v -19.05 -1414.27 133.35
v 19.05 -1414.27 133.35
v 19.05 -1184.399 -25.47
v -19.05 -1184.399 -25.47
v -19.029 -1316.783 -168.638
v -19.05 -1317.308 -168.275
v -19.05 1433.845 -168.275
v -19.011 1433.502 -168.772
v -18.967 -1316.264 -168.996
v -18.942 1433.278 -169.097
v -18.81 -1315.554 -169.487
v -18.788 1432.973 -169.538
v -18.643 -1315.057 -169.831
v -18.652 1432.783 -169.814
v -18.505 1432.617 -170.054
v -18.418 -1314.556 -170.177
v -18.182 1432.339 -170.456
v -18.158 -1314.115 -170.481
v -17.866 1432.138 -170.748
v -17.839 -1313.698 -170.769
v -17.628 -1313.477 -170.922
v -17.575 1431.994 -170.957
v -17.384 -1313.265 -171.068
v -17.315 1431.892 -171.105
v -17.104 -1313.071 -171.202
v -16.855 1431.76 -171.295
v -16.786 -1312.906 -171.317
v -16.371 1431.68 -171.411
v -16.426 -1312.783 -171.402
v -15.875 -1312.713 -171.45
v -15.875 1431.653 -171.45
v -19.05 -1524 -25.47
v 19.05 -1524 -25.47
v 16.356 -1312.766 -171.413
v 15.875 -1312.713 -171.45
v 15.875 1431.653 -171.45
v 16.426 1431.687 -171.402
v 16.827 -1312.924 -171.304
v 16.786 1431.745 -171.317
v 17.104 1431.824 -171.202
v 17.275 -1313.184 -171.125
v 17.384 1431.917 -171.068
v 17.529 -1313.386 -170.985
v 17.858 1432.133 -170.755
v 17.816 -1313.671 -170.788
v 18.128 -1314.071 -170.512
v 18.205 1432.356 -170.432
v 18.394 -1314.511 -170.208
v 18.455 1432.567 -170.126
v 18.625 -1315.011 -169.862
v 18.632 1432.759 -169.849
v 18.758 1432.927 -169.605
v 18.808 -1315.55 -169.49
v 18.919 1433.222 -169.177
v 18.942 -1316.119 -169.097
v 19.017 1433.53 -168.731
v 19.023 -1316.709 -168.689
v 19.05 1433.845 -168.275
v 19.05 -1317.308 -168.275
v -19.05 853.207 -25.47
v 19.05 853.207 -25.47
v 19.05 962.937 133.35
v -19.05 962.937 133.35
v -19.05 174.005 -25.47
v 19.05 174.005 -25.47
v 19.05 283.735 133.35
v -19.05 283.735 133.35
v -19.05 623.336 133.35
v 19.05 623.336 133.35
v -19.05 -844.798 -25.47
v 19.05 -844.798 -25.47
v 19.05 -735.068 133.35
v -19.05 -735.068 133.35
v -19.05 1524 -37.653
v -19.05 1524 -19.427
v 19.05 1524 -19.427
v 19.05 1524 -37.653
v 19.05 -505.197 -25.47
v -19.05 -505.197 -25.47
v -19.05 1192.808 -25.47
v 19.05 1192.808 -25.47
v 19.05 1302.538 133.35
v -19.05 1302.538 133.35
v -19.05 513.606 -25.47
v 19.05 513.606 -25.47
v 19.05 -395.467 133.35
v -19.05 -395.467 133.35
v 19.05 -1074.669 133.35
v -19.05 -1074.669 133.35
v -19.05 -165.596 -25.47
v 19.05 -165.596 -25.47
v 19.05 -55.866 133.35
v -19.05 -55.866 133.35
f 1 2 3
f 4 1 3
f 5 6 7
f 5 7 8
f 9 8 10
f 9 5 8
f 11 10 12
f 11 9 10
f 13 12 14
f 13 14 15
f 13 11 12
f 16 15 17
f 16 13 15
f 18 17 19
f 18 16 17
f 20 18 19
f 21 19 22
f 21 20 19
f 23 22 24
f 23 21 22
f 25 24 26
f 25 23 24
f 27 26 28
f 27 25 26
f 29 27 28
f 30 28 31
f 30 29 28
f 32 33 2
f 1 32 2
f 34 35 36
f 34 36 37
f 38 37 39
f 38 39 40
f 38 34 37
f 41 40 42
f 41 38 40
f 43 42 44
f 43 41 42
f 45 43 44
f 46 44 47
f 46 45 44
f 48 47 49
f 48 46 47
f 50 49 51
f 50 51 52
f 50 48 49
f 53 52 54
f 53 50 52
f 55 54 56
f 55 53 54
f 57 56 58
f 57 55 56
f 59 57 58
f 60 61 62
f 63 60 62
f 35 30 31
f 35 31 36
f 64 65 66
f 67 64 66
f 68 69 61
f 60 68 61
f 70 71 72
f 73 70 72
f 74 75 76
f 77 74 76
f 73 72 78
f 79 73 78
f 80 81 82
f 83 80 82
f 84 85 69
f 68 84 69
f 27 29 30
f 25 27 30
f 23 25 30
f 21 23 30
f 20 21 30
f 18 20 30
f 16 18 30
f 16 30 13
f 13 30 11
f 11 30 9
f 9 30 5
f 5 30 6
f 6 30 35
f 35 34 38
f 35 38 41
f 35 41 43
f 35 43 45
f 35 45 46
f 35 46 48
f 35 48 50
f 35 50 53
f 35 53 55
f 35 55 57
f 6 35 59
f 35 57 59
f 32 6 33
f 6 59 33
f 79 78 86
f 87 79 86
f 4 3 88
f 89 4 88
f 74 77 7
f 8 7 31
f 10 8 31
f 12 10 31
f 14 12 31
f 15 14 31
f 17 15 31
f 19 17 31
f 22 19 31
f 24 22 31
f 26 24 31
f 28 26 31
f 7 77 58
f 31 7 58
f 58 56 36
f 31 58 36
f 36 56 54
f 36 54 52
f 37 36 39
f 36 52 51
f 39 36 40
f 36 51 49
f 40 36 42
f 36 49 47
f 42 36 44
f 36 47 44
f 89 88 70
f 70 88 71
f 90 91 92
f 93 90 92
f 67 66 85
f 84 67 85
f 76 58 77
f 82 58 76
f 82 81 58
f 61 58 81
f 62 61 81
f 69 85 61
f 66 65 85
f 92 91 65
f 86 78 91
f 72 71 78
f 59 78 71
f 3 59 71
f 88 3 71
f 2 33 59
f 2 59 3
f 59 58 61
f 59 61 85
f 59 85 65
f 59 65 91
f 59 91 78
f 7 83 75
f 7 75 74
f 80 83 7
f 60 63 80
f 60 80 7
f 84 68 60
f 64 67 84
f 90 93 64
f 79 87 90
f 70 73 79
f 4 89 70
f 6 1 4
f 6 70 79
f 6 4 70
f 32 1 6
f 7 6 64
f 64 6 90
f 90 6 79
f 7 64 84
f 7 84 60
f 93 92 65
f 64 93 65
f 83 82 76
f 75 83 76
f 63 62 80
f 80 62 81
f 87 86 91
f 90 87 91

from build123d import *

# Parameters (mm, degrees)
F1_DEPTH = 1524
F3_DEPTH = 38.101


with BuildPart() as f1:
    # F0 (on Front) → F1 (new body, symmetric)
    with BuildSketch(Plane.XZ):
        with BuildLine():
            ThreePointArc((19.05, 168.275), (18.120064, 170.520064), (15.875, 171.45))
            Line((15.875, 171.45), (-15.875, 171.45))
            ThreePointArc((-15.875, 171.45), (-18.120064, 170.520064), (-19.05, 168.275))
            Line((-19.05, 168.275), (-19.05, -168.275))
            ThreePointArc((-19.05, -168.275), (-18.120064, -170.520064), (-15.875, -171.45))
            Line((-15.875, -171.45), (15.875, -171.45))
            ThreePointArc((15.875, -171.45), (18.120064, -170.520064), (19.05, -168.275))
            Line((19.05, -168.275), (19.05, 168.275))
        make_face()
    extrude(amount=F1_DEPTH, both=True)

    # F2 (on face) → F3 (cut, through all)
    with BuildSketch(Plane.YZ.offset(19.05)):
        Polygon((1302.537645, 133.35), (1532.521947, -25.305542), (1431.653422, -171.45), (1726.558447, -171.45), (1726.558447, 297.843307), (-1716.171622, 297.843307), (-1716.171622, -171.45), (-1312.712962, -171.45), (-1524, -25.469864), (-1414.269912, 133.35), (-1184.399055, -25.469864), (-1074.668967, 133.35), (-844.798111, -25.469864), (-735.068023, 133.35), (-505.197166, -25.469864), (-395.467078, 133.35), (-165.596221, -25.469864), (-55.866133, 133.35), (174.004723, -25.469864), (283.734811, 133.35), (513.605668, -25.469864), (623.335756, 133.35), (853.206612, -25.469864), (962.936701, 133.35), (1192.807557, -25.469864), align=None)
    extrude(amount=-F3_DEPTH, mode=Mode.SUBTRACT)


solid = f1.part
